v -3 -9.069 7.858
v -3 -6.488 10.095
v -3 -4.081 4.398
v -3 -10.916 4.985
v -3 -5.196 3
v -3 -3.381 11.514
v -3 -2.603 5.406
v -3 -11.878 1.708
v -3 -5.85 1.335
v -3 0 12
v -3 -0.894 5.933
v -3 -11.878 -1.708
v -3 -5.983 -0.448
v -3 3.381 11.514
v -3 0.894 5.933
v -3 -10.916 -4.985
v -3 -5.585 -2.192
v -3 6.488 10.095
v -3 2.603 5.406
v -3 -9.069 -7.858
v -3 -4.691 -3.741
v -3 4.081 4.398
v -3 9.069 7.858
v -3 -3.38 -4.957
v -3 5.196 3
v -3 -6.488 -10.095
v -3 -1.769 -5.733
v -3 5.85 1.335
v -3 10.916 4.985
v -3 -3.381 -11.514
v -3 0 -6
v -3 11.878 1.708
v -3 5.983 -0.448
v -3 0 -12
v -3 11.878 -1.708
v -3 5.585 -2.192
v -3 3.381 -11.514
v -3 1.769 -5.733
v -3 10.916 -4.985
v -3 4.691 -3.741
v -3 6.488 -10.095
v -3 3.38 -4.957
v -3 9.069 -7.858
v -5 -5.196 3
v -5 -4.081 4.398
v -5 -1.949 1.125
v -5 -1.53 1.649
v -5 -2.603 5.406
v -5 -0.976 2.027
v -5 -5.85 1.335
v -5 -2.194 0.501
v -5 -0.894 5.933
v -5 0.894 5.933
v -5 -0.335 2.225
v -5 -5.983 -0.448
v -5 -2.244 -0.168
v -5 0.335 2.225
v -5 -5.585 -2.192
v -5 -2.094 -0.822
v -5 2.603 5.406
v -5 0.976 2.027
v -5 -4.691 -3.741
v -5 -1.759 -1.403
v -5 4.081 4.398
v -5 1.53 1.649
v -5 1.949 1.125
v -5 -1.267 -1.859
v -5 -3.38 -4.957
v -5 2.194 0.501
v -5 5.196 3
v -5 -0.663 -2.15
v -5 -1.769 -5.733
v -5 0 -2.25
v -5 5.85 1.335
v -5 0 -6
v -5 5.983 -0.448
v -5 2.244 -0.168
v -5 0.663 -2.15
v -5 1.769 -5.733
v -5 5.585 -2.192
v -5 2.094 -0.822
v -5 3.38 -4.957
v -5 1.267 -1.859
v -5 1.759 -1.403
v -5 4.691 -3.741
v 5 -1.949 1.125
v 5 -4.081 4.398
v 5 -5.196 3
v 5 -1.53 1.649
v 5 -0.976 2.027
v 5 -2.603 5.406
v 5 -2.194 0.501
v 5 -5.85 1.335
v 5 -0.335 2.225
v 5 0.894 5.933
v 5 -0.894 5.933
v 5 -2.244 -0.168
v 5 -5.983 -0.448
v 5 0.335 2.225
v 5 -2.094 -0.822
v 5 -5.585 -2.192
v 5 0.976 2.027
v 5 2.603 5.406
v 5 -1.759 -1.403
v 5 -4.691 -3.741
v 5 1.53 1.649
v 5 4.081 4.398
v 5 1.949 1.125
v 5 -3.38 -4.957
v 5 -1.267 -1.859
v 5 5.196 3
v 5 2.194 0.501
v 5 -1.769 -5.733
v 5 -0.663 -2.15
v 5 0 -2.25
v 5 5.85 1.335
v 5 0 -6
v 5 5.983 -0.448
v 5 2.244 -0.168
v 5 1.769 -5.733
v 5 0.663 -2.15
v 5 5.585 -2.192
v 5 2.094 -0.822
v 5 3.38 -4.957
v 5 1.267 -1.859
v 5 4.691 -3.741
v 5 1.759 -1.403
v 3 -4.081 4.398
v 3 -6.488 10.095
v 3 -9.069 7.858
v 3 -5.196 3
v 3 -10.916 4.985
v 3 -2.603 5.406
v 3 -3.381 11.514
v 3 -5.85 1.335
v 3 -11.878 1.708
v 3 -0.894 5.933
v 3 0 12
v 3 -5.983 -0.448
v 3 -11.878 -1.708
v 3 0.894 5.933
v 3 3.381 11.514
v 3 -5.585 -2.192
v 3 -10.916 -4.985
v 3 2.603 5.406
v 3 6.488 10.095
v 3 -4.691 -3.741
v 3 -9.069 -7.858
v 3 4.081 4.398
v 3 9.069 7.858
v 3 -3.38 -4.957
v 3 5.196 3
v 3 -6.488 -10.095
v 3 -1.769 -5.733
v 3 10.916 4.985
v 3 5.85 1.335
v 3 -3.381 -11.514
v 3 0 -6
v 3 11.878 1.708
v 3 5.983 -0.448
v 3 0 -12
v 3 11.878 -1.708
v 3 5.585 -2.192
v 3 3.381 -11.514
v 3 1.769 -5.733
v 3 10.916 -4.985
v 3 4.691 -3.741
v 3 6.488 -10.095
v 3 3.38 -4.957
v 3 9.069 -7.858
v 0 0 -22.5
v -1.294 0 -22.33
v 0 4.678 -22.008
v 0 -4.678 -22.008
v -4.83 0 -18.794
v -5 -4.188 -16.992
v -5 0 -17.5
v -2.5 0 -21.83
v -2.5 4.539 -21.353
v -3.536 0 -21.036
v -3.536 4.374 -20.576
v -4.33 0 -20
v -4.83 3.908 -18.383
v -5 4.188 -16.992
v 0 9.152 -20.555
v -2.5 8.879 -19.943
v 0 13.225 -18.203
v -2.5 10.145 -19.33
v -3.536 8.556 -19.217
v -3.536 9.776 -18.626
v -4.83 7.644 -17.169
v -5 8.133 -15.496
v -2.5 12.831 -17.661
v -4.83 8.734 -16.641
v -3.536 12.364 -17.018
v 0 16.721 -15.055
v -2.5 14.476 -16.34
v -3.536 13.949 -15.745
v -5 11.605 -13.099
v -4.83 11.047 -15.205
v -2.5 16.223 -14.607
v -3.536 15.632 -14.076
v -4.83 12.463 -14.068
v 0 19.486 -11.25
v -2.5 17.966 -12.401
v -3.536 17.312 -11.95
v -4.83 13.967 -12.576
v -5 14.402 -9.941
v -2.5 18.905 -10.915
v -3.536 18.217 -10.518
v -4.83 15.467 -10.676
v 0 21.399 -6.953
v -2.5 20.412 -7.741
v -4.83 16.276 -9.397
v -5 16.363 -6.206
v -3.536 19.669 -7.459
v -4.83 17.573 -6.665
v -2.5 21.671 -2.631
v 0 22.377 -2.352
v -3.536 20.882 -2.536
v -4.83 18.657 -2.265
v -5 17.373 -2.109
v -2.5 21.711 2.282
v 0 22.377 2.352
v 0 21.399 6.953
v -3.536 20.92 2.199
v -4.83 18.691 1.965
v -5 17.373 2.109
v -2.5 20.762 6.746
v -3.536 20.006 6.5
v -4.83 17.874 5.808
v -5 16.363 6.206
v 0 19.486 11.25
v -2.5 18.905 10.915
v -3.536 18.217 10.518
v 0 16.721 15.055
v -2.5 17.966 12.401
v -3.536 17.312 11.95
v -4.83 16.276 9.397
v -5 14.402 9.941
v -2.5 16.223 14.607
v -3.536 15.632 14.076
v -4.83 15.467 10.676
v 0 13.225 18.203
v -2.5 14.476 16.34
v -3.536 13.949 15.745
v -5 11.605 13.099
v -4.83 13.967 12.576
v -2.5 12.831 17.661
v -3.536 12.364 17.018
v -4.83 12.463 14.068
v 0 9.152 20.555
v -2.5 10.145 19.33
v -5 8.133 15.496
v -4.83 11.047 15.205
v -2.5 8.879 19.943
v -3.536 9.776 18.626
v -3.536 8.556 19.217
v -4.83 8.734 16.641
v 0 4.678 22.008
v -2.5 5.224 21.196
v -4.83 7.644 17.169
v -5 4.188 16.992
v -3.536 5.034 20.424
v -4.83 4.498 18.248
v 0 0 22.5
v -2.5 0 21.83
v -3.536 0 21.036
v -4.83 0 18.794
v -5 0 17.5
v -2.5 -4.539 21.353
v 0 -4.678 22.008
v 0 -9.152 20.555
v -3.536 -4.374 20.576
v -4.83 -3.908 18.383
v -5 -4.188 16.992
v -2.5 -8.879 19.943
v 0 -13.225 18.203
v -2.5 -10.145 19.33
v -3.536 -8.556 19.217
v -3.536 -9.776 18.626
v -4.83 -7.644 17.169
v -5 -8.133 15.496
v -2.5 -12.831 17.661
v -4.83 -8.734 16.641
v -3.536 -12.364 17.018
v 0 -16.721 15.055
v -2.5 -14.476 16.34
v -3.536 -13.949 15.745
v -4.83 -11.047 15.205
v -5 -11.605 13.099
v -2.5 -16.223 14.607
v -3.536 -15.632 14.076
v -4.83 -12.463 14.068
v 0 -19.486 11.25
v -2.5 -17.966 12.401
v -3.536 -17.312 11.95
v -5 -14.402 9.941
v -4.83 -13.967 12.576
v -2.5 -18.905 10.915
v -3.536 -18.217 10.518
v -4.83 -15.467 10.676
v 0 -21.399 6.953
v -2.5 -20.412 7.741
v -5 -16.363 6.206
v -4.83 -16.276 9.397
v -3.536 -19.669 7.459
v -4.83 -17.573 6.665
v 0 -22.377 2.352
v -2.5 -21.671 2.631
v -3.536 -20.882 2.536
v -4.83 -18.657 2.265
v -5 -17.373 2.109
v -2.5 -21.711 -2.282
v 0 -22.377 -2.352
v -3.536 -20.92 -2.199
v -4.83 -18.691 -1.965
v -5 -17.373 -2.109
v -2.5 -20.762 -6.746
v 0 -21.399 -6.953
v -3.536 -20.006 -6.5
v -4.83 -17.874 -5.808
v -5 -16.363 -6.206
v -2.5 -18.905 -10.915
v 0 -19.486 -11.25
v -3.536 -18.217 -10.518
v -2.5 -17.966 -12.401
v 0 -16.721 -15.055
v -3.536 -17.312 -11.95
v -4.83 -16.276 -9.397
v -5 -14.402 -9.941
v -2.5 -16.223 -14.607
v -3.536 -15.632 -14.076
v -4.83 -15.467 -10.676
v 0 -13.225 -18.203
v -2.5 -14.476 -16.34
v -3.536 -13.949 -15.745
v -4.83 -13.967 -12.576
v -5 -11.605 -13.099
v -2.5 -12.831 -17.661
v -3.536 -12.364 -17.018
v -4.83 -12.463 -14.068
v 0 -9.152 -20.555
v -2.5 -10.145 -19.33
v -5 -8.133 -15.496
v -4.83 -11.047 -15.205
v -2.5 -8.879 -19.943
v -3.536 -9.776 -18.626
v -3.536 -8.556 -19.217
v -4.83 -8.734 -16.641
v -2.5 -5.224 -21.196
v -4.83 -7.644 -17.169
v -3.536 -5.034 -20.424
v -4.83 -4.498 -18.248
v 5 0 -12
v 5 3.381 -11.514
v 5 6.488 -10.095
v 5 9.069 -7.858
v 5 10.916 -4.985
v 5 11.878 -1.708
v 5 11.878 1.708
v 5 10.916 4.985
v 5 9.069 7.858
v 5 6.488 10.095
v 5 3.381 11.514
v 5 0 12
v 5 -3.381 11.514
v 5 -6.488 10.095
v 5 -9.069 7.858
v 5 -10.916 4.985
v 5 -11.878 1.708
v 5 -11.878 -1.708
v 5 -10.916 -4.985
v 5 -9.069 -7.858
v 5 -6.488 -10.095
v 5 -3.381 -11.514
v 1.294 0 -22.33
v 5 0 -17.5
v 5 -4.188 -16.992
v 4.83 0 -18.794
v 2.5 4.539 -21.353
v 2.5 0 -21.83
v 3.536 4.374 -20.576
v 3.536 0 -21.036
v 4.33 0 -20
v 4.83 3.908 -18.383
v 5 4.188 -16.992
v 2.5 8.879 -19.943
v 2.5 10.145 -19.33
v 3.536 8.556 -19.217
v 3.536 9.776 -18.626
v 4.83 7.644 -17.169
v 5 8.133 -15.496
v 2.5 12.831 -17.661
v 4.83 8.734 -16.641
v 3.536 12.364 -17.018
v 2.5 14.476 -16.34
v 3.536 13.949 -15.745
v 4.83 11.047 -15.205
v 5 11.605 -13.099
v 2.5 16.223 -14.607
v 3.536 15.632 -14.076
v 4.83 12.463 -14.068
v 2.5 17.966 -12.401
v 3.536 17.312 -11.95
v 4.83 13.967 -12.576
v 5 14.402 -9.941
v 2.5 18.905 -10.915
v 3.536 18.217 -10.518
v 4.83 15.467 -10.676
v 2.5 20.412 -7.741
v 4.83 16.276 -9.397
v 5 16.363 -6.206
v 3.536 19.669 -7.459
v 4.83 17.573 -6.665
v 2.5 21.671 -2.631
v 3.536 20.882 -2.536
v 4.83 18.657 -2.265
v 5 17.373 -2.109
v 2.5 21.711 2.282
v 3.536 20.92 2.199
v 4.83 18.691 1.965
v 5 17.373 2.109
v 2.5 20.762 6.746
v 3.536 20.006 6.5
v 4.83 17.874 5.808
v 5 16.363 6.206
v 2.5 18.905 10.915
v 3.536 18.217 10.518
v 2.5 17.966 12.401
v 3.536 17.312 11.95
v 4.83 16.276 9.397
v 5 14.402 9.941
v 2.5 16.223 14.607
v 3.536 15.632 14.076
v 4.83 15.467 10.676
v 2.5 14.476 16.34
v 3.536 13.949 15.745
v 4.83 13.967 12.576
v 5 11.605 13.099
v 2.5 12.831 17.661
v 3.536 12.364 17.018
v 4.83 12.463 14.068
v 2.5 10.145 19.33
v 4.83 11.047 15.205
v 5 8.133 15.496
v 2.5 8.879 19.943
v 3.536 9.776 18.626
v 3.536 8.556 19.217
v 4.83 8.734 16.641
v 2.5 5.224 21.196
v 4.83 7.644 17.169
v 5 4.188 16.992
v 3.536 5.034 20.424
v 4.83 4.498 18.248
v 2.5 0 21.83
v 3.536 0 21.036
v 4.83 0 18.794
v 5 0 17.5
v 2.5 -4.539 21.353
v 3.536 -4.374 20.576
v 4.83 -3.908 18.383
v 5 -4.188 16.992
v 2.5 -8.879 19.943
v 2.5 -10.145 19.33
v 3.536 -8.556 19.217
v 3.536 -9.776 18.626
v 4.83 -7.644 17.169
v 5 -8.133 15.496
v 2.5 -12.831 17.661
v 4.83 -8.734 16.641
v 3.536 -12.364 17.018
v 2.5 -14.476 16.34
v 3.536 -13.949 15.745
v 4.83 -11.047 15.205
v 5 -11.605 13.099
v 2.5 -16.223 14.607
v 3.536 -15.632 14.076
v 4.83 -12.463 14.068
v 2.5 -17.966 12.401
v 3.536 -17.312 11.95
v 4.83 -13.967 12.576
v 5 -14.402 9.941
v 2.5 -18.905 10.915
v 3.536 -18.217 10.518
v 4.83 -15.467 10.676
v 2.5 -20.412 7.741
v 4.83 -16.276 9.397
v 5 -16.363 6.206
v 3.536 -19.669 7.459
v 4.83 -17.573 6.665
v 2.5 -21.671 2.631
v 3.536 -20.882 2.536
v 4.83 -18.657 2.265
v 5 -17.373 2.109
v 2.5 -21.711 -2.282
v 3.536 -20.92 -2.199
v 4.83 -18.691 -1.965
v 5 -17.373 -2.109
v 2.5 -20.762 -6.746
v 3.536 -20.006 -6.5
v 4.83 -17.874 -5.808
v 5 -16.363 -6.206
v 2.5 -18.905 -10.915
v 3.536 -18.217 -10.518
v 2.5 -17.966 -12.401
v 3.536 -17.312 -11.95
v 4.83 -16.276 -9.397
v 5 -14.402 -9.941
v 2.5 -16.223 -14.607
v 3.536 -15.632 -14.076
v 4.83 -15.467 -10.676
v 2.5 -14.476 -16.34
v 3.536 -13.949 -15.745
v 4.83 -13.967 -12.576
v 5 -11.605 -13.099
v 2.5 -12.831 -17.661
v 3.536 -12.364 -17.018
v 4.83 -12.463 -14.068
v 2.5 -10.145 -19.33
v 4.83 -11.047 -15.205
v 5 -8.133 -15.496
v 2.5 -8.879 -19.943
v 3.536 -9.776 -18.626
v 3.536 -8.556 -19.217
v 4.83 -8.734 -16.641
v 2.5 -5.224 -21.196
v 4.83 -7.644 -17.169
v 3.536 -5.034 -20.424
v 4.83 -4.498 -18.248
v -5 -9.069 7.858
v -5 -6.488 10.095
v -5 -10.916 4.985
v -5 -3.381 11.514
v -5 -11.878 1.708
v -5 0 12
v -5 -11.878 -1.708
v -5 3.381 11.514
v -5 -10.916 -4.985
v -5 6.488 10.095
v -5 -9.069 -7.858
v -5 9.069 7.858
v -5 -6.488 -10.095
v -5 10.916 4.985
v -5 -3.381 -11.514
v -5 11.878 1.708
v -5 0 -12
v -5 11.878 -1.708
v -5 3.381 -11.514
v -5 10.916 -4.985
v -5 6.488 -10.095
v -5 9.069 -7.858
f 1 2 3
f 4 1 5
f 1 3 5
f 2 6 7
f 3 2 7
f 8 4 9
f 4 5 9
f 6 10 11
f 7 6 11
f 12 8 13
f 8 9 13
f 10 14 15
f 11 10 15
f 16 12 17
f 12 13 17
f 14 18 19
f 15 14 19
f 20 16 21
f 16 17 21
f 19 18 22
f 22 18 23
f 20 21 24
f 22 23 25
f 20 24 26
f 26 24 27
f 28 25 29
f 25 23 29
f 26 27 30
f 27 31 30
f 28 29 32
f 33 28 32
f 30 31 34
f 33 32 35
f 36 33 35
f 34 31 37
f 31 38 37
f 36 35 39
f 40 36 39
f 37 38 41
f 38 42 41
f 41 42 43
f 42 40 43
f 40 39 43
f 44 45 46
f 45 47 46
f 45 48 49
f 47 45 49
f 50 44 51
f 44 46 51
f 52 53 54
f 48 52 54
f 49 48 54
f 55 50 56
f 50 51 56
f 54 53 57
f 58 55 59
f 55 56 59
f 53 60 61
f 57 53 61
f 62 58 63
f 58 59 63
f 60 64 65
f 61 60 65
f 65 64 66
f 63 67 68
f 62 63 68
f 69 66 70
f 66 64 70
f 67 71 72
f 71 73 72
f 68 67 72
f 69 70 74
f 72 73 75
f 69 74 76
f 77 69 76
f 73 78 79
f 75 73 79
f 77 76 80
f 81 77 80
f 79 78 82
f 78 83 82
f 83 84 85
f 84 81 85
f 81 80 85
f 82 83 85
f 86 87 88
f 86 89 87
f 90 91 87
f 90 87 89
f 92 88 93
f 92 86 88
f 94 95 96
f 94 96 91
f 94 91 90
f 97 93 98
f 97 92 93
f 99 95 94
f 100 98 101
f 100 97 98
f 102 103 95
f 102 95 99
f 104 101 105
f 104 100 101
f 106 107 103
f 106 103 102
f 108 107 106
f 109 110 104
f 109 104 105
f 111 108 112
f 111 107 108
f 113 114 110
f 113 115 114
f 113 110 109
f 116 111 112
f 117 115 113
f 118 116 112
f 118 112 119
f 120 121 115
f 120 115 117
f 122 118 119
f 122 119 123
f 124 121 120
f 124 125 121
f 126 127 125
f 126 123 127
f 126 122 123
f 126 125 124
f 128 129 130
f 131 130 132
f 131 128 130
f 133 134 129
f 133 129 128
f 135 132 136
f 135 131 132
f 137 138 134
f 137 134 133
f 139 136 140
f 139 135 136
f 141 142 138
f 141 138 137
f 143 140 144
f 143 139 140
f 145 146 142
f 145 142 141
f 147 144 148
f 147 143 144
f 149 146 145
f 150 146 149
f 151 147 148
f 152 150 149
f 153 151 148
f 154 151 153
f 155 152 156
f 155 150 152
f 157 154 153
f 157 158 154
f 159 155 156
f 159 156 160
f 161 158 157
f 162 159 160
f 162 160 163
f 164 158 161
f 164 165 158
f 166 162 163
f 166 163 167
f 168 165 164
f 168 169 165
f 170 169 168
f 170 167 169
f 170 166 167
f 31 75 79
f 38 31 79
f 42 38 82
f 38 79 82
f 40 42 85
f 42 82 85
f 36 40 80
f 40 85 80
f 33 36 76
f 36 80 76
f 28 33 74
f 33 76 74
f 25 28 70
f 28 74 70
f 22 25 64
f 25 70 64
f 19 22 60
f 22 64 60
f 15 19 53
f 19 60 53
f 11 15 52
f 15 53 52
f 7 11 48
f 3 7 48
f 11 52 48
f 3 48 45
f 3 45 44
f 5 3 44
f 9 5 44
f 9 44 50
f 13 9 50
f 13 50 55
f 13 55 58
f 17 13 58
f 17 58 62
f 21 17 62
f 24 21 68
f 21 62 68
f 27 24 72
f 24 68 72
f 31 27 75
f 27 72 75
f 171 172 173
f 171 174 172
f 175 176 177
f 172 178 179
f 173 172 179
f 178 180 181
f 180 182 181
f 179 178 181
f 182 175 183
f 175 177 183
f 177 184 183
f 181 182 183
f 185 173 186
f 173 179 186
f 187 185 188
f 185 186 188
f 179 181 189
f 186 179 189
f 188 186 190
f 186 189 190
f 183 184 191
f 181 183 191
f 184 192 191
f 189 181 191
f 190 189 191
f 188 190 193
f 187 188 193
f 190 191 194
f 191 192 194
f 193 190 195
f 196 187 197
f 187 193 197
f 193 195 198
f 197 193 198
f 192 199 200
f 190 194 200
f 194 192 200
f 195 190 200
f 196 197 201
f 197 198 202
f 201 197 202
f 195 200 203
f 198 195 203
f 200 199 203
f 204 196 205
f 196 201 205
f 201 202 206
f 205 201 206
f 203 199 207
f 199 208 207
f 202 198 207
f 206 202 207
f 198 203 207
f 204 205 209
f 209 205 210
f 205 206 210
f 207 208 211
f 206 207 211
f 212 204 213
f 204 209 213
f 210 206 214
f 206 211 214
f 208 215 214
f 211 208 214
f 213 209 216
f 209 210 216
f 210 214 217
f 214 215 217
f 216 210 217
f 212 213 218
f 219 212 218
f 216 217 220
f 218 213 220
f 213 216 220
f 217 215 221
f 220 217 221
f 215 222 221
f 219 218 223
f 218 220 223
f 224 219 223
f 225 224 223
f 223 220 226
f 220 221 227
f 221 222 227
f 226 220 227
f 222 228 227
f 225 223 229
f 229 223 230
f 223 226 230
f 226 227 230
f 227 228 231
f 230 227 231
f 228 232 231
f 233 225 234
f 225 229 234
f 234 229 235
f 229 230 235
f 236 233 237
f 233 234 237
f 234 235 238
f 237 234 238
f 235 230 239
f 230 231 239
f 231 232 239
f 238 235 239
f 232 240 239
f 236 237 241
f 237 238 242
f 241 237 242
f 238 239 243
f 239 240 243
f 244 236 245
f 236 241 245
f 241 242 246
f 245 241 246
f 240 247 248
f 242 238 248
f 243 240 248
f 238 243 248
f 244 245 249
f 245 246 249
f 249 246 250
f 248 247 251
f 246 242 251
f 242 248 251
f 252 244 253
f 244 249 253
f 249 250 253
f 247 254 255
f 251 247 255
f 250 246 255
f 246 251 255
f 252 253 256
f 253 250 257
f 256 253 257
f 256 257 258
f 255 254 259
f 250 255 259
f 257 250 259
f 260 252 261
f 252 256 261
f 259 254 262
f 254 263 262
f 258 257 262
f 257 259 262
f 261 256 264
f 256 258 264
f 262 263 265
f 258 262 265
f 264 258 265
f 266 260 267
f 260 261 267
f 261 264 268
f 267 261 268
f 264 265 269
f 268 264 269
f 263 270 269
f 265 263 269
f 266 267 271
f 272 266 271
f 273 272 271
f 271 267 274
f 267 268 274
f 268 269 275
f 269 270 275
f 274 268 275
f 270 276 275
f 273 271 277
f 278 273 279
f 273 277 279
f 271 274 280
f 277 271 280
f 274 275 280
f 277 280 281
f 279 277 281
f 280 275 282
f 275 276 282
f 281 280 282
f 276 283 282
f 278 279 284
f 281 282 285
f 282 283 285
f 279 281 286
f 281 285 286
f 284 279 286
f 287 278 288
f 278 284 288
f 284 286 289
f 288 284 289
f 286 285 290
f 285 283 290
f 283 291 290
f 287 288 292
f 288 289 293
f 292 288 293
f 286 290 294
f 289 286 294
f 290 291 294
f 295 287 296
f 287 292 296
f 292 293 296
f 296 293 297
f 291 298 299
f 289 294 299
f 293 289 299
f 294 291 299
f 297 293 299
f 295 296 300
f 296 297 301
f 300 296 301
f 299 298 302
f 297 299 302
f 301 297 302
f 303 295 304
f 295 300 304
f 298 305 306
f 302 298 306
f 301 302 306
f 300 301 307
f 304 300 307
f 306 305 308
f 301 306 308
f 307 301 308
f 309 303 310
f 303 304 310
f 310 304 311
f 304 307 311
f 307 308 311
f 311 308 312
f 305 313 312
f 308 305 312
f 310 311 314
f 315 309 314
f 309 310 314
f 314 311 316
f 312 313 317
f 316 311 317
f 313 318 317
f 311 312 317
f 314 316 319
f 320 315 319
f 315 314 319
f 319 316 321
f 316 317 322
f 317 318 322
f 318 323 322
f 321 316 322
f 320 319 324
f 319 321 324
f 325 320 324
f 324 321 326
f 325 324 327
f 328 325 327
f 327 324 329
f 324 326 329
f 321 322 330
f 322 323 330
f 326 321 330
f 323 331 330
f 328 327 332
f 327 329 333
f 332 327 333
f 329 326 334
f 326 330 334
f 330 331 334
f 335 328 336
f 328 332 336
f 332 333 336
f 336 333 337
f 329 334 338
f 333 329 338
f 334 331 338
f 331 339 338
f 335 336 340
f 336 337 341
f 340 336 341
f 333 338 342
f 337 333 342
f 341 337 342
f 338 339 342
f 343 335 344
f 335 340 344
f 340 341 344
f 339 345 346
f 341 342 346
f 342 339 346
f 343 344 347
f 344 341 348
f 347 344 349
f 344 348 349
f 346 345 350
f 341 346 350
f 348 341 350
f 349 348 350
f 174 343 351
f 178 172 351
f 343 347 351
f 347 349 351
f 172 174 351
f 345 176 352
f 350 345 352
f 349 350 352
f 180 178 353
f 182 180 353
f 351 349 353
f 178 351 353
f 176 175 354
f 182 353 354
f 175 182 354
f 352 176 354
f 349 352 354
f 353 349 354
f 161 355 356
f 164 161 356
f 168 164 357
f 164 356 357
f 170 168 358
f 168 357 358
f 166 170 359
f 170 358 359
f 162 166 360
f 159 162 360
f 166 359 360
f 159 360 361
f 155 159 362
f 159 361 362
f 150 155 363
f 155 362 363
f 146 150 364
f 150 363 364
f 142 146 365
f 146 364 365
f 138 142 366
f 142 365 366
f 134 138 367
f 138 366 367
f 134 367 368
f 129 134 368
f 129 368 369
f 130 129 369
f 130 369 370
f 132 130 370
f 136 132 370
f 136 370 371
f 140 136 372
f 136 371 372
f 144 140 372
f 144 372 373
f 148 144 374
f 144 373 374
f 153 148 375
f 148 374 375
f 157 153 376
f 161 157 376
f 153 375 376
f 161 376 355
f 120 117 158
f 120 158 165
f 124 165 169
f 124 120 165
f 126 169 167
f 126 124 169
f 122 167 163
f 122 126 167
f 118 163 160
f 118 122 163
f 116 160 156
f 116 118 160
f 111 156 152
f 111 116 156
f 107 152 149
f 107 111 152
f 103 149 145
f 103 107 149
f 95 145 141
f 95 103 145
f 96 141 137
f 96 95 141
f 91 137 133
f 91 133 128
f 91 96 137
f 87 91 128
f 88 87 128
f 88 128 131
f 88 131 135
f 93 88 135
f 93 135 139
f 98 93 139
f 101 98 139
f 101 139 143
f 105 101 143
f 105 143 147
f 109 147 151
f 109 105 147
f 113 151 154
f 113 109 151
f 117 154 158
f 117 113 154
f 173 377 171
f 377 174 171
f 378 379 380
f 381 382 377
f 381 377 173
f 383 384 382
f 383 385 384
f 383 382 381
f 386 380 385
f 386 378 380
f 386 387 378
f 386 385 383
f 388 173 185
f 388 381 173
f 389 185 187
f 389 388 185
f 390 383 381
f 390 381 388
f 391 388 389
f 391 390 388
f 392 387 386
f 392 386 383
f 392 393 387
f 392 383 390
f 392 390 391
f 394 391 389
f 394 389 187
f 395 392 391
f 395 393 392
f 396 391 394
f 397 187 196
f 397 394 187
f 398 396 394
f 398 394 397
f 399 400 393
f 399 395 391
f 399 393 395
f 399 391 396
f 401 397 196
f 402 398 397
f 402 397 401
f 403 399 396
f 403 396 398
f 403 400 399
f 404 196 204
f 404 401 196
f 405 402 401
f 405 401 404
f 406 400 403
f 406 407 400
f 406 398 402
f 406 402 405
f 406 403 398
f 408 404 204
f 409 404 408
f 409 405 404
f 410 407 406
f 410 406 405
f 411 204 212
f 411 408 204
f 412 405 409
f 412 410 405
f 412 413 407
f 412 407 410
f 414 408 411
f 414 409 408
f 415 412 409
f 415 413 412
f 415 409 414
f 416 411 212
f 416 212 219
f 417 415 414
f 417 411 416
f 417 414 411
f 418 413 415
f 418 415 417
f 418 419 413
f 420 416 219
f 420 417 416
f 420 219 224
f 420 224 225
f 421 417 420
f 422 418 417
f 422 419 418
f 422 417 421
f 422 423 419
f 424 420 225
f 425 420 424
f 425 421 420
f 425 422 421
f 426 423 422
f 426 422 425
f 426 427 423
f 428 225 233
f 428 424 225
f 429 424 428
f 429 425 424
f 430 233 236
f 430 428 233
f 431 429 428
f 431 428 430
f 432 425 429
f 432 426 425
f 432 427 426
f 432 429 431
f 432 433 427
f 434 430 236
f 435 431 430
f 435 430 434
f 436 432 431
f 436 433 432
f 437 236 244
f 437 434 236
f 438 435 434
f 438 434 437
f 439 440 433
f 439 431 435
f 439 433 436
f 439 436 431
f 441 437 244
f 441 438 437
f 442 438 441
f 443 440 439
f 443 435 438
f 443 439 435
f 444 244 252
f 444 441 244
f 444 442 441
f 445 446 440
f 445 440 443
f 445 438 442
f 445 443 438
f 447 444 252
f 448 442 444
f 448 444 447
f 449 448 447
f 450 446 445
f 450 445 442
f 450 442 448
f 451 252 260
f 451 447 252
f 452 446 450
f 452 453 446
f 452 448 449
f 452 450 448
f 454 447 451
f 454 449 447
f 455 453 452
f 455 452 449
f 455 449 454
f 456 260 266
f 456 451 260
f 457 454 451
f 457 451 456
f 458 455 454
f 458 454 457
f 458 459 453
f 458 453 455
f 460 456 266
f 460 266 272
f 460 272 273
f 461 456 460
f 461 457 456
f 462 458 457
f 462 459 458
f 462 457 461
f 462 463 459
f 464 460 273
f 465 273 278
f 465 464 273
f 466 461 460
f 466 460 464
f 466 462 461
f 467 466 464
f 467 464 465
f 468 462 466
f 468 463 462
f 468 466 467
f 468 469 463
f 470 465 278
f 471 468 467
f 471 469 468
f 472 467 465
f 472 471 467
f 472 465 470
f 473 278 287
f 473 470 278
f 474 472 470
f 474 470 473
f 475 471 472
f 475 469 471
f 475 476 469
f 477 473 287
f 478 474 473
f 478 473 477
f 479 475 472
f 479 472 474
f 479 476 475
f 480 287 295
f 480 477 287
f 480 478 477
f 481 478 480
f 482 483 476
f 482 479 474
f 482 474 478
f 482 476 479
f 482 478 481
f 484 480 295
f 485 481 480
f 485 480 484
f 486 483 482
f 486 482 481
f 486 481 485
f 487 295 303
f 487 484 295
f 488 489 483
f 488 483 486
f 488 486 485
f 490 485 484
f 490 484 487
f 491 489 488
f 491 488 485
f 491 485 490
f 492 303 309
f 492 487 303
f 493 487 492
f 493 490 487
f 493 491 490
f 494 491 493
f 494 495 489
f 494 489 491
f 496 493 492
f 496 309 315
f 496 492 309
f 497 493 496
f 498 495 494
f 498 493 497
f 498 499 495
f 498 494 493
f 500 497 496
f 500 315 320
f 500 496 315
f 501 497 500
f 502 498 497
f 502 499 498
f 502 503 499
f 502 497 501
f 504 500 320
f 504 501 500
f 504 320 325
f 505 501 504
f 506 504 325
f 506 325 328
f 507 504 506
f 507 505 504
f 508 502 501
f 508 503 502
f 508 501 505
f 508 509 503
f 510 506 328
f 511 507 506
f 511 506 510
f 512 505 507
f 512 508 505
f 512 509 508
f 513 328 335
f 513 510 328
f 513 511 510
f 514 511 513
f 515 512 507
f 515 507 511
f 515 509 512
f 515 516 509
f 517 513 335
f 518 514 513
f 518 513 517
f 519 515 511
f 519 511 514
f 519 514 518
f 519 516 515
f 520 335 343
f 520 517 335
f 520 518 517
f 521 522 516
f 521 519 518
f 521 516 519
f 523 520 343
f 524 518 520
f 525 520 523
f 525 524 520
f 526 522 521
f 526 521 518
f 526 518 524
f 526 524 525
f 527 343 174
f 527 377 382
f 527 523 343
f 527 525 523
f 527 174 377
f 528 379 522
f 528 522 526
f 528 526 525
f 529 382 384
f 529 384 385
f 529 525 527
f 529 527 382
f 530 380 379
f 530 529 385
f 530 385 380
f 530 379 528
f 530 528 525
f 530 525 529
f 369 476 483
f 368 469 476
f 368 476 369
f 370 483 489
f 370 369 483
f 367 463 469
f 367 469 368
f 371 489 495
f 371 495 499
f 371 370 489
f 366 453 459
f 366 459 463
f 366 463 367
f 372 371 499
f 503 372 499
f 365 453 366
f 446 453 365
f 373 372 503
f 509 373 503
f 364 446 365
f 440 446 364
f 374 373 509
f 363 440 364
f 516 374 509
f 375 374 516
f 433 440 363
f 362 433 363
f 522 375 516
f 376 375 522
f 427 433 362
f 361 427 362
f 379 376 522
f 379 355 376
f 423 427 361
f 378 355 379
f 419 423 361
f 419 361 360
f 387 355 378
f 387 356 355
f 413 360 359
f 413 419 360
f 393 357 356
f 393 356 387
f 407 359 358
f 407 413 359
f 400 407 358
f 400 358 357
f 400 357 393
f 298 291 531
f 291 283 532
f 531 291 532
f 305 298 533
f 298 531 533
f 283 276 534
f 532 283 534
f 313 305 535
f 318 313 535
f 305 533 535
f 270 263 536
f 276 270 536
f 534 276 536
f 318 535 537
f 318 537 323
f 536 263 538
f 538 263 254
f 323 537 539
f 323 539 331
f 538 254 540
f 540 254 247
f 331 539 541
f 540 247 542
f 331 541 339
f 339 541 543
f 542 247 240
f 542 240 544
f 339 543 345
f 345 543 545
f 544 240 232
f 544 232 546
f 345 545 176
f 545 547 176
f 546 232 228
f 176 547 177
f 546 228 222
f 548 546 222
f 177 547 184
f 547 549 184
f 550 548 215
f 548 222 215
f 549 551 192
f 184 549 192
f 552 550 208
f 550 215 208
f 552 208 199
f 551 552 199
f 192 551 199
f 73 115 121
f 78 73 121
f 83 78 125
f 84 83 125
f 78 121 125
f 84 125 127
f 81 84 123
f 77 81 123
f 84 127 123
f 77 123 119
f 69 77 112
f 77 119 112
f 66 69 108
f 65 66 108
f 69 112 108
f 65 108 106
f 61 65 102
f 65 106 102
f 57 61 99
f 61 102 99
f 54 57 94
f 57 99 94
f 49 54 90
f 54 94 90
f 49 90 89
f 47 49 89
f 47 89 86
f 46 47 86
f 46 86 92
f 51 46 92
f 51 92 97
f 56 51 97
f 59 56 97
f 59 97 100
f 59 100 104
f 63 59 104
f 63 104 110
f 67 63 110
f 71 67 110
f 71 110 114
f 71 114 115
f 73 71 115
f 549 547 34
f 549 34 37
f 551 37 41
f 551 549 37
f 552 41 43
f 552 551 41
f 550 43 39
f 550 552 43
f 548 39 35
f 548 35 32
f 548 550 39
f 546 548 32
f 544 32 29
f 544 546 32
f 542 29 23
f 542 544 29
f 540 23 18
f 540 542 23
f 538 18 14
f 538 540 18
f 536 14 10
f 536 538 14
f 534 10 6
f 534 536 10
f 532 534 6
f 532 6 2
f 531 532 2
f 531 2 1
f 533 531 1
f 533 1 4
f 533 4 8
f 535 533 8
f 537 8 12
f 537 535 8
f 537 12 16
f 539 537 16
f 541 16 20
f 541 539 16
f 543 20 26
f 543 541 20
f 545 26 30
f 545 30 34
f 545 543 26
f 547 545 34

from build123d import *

# Parameters (mm, degrees)
SKETCH2_R           = 22.5
BOSS_EXTRUDE1_DEPTH = 5
FILLET1_R           = 5
SKETCH3_R           = 12
SKETCH3_R_2         = 6
CUT_EXTRUDE1_DEPTH  = 2
SKETCH4_R           = 2.25
CUT_EXTRUDE2_DEPTH  = 34.354160228


with BuildPart() as part:
    # Sketch2 → Boss-Extrude1 (new, symmetric)
    with BuildSketch(Plane(origin=(0, 0, 0), x_dir=(0, 0, -1), z_dir=(1, 0, 0))):
        Circle(SKETCH2_R)
    extrude(amount=BOSS_EXTRUDE1_DEPTH, both=True)

    # Fillet1
    fillet1_edges = [part.edges().sort_by_distance(p)[0] for p in [
        (-5, 0, 22.5),
        (5, 0, 22.5),
    ]]
    fillet(fillet1_edges, radius=FILLET1_R - 0.0001)  # a hair under: the kernel refuses the full size

    # Sketch3 → Cut-Extrude1 (cut)
    with BuildSketch(Plane(origin=(5, 0, 0), x_dir=(0, 0, -1), z_dir=(1, 0, 0))):
        Circle(SKETCH3_R)
        Circle(SKETCH3_R_2, mode=Mode.SUBTRACT)
    cut_extrude1 = extrude(amount=-CUT_EXTRUDE1_DEPTH, mode=Mode.SUBTRACT)

    # Mirror1: Cut-Extrude1 across plane
    add(cut_extrude1.mirror(Plane(origin=(0, 0, 0), x_dir=(0, 0, 1), z_dir=(1, 0, 0))), mode=Mode.SUBTRACT)

    # Sketch4 → Cut-Extrude2 (cut, through all)
    with BuildSketch(Plane(origin=(5, 0, 0), x_dir=(0, 0, -1), z_dir=(1, 0, 0))):
        Circle(SKETCH4_R)
    extrude(amount=-CUT_EXTRUDE2_DEPTH, mode=Mode.SUBTRACT)


solid = part.part
